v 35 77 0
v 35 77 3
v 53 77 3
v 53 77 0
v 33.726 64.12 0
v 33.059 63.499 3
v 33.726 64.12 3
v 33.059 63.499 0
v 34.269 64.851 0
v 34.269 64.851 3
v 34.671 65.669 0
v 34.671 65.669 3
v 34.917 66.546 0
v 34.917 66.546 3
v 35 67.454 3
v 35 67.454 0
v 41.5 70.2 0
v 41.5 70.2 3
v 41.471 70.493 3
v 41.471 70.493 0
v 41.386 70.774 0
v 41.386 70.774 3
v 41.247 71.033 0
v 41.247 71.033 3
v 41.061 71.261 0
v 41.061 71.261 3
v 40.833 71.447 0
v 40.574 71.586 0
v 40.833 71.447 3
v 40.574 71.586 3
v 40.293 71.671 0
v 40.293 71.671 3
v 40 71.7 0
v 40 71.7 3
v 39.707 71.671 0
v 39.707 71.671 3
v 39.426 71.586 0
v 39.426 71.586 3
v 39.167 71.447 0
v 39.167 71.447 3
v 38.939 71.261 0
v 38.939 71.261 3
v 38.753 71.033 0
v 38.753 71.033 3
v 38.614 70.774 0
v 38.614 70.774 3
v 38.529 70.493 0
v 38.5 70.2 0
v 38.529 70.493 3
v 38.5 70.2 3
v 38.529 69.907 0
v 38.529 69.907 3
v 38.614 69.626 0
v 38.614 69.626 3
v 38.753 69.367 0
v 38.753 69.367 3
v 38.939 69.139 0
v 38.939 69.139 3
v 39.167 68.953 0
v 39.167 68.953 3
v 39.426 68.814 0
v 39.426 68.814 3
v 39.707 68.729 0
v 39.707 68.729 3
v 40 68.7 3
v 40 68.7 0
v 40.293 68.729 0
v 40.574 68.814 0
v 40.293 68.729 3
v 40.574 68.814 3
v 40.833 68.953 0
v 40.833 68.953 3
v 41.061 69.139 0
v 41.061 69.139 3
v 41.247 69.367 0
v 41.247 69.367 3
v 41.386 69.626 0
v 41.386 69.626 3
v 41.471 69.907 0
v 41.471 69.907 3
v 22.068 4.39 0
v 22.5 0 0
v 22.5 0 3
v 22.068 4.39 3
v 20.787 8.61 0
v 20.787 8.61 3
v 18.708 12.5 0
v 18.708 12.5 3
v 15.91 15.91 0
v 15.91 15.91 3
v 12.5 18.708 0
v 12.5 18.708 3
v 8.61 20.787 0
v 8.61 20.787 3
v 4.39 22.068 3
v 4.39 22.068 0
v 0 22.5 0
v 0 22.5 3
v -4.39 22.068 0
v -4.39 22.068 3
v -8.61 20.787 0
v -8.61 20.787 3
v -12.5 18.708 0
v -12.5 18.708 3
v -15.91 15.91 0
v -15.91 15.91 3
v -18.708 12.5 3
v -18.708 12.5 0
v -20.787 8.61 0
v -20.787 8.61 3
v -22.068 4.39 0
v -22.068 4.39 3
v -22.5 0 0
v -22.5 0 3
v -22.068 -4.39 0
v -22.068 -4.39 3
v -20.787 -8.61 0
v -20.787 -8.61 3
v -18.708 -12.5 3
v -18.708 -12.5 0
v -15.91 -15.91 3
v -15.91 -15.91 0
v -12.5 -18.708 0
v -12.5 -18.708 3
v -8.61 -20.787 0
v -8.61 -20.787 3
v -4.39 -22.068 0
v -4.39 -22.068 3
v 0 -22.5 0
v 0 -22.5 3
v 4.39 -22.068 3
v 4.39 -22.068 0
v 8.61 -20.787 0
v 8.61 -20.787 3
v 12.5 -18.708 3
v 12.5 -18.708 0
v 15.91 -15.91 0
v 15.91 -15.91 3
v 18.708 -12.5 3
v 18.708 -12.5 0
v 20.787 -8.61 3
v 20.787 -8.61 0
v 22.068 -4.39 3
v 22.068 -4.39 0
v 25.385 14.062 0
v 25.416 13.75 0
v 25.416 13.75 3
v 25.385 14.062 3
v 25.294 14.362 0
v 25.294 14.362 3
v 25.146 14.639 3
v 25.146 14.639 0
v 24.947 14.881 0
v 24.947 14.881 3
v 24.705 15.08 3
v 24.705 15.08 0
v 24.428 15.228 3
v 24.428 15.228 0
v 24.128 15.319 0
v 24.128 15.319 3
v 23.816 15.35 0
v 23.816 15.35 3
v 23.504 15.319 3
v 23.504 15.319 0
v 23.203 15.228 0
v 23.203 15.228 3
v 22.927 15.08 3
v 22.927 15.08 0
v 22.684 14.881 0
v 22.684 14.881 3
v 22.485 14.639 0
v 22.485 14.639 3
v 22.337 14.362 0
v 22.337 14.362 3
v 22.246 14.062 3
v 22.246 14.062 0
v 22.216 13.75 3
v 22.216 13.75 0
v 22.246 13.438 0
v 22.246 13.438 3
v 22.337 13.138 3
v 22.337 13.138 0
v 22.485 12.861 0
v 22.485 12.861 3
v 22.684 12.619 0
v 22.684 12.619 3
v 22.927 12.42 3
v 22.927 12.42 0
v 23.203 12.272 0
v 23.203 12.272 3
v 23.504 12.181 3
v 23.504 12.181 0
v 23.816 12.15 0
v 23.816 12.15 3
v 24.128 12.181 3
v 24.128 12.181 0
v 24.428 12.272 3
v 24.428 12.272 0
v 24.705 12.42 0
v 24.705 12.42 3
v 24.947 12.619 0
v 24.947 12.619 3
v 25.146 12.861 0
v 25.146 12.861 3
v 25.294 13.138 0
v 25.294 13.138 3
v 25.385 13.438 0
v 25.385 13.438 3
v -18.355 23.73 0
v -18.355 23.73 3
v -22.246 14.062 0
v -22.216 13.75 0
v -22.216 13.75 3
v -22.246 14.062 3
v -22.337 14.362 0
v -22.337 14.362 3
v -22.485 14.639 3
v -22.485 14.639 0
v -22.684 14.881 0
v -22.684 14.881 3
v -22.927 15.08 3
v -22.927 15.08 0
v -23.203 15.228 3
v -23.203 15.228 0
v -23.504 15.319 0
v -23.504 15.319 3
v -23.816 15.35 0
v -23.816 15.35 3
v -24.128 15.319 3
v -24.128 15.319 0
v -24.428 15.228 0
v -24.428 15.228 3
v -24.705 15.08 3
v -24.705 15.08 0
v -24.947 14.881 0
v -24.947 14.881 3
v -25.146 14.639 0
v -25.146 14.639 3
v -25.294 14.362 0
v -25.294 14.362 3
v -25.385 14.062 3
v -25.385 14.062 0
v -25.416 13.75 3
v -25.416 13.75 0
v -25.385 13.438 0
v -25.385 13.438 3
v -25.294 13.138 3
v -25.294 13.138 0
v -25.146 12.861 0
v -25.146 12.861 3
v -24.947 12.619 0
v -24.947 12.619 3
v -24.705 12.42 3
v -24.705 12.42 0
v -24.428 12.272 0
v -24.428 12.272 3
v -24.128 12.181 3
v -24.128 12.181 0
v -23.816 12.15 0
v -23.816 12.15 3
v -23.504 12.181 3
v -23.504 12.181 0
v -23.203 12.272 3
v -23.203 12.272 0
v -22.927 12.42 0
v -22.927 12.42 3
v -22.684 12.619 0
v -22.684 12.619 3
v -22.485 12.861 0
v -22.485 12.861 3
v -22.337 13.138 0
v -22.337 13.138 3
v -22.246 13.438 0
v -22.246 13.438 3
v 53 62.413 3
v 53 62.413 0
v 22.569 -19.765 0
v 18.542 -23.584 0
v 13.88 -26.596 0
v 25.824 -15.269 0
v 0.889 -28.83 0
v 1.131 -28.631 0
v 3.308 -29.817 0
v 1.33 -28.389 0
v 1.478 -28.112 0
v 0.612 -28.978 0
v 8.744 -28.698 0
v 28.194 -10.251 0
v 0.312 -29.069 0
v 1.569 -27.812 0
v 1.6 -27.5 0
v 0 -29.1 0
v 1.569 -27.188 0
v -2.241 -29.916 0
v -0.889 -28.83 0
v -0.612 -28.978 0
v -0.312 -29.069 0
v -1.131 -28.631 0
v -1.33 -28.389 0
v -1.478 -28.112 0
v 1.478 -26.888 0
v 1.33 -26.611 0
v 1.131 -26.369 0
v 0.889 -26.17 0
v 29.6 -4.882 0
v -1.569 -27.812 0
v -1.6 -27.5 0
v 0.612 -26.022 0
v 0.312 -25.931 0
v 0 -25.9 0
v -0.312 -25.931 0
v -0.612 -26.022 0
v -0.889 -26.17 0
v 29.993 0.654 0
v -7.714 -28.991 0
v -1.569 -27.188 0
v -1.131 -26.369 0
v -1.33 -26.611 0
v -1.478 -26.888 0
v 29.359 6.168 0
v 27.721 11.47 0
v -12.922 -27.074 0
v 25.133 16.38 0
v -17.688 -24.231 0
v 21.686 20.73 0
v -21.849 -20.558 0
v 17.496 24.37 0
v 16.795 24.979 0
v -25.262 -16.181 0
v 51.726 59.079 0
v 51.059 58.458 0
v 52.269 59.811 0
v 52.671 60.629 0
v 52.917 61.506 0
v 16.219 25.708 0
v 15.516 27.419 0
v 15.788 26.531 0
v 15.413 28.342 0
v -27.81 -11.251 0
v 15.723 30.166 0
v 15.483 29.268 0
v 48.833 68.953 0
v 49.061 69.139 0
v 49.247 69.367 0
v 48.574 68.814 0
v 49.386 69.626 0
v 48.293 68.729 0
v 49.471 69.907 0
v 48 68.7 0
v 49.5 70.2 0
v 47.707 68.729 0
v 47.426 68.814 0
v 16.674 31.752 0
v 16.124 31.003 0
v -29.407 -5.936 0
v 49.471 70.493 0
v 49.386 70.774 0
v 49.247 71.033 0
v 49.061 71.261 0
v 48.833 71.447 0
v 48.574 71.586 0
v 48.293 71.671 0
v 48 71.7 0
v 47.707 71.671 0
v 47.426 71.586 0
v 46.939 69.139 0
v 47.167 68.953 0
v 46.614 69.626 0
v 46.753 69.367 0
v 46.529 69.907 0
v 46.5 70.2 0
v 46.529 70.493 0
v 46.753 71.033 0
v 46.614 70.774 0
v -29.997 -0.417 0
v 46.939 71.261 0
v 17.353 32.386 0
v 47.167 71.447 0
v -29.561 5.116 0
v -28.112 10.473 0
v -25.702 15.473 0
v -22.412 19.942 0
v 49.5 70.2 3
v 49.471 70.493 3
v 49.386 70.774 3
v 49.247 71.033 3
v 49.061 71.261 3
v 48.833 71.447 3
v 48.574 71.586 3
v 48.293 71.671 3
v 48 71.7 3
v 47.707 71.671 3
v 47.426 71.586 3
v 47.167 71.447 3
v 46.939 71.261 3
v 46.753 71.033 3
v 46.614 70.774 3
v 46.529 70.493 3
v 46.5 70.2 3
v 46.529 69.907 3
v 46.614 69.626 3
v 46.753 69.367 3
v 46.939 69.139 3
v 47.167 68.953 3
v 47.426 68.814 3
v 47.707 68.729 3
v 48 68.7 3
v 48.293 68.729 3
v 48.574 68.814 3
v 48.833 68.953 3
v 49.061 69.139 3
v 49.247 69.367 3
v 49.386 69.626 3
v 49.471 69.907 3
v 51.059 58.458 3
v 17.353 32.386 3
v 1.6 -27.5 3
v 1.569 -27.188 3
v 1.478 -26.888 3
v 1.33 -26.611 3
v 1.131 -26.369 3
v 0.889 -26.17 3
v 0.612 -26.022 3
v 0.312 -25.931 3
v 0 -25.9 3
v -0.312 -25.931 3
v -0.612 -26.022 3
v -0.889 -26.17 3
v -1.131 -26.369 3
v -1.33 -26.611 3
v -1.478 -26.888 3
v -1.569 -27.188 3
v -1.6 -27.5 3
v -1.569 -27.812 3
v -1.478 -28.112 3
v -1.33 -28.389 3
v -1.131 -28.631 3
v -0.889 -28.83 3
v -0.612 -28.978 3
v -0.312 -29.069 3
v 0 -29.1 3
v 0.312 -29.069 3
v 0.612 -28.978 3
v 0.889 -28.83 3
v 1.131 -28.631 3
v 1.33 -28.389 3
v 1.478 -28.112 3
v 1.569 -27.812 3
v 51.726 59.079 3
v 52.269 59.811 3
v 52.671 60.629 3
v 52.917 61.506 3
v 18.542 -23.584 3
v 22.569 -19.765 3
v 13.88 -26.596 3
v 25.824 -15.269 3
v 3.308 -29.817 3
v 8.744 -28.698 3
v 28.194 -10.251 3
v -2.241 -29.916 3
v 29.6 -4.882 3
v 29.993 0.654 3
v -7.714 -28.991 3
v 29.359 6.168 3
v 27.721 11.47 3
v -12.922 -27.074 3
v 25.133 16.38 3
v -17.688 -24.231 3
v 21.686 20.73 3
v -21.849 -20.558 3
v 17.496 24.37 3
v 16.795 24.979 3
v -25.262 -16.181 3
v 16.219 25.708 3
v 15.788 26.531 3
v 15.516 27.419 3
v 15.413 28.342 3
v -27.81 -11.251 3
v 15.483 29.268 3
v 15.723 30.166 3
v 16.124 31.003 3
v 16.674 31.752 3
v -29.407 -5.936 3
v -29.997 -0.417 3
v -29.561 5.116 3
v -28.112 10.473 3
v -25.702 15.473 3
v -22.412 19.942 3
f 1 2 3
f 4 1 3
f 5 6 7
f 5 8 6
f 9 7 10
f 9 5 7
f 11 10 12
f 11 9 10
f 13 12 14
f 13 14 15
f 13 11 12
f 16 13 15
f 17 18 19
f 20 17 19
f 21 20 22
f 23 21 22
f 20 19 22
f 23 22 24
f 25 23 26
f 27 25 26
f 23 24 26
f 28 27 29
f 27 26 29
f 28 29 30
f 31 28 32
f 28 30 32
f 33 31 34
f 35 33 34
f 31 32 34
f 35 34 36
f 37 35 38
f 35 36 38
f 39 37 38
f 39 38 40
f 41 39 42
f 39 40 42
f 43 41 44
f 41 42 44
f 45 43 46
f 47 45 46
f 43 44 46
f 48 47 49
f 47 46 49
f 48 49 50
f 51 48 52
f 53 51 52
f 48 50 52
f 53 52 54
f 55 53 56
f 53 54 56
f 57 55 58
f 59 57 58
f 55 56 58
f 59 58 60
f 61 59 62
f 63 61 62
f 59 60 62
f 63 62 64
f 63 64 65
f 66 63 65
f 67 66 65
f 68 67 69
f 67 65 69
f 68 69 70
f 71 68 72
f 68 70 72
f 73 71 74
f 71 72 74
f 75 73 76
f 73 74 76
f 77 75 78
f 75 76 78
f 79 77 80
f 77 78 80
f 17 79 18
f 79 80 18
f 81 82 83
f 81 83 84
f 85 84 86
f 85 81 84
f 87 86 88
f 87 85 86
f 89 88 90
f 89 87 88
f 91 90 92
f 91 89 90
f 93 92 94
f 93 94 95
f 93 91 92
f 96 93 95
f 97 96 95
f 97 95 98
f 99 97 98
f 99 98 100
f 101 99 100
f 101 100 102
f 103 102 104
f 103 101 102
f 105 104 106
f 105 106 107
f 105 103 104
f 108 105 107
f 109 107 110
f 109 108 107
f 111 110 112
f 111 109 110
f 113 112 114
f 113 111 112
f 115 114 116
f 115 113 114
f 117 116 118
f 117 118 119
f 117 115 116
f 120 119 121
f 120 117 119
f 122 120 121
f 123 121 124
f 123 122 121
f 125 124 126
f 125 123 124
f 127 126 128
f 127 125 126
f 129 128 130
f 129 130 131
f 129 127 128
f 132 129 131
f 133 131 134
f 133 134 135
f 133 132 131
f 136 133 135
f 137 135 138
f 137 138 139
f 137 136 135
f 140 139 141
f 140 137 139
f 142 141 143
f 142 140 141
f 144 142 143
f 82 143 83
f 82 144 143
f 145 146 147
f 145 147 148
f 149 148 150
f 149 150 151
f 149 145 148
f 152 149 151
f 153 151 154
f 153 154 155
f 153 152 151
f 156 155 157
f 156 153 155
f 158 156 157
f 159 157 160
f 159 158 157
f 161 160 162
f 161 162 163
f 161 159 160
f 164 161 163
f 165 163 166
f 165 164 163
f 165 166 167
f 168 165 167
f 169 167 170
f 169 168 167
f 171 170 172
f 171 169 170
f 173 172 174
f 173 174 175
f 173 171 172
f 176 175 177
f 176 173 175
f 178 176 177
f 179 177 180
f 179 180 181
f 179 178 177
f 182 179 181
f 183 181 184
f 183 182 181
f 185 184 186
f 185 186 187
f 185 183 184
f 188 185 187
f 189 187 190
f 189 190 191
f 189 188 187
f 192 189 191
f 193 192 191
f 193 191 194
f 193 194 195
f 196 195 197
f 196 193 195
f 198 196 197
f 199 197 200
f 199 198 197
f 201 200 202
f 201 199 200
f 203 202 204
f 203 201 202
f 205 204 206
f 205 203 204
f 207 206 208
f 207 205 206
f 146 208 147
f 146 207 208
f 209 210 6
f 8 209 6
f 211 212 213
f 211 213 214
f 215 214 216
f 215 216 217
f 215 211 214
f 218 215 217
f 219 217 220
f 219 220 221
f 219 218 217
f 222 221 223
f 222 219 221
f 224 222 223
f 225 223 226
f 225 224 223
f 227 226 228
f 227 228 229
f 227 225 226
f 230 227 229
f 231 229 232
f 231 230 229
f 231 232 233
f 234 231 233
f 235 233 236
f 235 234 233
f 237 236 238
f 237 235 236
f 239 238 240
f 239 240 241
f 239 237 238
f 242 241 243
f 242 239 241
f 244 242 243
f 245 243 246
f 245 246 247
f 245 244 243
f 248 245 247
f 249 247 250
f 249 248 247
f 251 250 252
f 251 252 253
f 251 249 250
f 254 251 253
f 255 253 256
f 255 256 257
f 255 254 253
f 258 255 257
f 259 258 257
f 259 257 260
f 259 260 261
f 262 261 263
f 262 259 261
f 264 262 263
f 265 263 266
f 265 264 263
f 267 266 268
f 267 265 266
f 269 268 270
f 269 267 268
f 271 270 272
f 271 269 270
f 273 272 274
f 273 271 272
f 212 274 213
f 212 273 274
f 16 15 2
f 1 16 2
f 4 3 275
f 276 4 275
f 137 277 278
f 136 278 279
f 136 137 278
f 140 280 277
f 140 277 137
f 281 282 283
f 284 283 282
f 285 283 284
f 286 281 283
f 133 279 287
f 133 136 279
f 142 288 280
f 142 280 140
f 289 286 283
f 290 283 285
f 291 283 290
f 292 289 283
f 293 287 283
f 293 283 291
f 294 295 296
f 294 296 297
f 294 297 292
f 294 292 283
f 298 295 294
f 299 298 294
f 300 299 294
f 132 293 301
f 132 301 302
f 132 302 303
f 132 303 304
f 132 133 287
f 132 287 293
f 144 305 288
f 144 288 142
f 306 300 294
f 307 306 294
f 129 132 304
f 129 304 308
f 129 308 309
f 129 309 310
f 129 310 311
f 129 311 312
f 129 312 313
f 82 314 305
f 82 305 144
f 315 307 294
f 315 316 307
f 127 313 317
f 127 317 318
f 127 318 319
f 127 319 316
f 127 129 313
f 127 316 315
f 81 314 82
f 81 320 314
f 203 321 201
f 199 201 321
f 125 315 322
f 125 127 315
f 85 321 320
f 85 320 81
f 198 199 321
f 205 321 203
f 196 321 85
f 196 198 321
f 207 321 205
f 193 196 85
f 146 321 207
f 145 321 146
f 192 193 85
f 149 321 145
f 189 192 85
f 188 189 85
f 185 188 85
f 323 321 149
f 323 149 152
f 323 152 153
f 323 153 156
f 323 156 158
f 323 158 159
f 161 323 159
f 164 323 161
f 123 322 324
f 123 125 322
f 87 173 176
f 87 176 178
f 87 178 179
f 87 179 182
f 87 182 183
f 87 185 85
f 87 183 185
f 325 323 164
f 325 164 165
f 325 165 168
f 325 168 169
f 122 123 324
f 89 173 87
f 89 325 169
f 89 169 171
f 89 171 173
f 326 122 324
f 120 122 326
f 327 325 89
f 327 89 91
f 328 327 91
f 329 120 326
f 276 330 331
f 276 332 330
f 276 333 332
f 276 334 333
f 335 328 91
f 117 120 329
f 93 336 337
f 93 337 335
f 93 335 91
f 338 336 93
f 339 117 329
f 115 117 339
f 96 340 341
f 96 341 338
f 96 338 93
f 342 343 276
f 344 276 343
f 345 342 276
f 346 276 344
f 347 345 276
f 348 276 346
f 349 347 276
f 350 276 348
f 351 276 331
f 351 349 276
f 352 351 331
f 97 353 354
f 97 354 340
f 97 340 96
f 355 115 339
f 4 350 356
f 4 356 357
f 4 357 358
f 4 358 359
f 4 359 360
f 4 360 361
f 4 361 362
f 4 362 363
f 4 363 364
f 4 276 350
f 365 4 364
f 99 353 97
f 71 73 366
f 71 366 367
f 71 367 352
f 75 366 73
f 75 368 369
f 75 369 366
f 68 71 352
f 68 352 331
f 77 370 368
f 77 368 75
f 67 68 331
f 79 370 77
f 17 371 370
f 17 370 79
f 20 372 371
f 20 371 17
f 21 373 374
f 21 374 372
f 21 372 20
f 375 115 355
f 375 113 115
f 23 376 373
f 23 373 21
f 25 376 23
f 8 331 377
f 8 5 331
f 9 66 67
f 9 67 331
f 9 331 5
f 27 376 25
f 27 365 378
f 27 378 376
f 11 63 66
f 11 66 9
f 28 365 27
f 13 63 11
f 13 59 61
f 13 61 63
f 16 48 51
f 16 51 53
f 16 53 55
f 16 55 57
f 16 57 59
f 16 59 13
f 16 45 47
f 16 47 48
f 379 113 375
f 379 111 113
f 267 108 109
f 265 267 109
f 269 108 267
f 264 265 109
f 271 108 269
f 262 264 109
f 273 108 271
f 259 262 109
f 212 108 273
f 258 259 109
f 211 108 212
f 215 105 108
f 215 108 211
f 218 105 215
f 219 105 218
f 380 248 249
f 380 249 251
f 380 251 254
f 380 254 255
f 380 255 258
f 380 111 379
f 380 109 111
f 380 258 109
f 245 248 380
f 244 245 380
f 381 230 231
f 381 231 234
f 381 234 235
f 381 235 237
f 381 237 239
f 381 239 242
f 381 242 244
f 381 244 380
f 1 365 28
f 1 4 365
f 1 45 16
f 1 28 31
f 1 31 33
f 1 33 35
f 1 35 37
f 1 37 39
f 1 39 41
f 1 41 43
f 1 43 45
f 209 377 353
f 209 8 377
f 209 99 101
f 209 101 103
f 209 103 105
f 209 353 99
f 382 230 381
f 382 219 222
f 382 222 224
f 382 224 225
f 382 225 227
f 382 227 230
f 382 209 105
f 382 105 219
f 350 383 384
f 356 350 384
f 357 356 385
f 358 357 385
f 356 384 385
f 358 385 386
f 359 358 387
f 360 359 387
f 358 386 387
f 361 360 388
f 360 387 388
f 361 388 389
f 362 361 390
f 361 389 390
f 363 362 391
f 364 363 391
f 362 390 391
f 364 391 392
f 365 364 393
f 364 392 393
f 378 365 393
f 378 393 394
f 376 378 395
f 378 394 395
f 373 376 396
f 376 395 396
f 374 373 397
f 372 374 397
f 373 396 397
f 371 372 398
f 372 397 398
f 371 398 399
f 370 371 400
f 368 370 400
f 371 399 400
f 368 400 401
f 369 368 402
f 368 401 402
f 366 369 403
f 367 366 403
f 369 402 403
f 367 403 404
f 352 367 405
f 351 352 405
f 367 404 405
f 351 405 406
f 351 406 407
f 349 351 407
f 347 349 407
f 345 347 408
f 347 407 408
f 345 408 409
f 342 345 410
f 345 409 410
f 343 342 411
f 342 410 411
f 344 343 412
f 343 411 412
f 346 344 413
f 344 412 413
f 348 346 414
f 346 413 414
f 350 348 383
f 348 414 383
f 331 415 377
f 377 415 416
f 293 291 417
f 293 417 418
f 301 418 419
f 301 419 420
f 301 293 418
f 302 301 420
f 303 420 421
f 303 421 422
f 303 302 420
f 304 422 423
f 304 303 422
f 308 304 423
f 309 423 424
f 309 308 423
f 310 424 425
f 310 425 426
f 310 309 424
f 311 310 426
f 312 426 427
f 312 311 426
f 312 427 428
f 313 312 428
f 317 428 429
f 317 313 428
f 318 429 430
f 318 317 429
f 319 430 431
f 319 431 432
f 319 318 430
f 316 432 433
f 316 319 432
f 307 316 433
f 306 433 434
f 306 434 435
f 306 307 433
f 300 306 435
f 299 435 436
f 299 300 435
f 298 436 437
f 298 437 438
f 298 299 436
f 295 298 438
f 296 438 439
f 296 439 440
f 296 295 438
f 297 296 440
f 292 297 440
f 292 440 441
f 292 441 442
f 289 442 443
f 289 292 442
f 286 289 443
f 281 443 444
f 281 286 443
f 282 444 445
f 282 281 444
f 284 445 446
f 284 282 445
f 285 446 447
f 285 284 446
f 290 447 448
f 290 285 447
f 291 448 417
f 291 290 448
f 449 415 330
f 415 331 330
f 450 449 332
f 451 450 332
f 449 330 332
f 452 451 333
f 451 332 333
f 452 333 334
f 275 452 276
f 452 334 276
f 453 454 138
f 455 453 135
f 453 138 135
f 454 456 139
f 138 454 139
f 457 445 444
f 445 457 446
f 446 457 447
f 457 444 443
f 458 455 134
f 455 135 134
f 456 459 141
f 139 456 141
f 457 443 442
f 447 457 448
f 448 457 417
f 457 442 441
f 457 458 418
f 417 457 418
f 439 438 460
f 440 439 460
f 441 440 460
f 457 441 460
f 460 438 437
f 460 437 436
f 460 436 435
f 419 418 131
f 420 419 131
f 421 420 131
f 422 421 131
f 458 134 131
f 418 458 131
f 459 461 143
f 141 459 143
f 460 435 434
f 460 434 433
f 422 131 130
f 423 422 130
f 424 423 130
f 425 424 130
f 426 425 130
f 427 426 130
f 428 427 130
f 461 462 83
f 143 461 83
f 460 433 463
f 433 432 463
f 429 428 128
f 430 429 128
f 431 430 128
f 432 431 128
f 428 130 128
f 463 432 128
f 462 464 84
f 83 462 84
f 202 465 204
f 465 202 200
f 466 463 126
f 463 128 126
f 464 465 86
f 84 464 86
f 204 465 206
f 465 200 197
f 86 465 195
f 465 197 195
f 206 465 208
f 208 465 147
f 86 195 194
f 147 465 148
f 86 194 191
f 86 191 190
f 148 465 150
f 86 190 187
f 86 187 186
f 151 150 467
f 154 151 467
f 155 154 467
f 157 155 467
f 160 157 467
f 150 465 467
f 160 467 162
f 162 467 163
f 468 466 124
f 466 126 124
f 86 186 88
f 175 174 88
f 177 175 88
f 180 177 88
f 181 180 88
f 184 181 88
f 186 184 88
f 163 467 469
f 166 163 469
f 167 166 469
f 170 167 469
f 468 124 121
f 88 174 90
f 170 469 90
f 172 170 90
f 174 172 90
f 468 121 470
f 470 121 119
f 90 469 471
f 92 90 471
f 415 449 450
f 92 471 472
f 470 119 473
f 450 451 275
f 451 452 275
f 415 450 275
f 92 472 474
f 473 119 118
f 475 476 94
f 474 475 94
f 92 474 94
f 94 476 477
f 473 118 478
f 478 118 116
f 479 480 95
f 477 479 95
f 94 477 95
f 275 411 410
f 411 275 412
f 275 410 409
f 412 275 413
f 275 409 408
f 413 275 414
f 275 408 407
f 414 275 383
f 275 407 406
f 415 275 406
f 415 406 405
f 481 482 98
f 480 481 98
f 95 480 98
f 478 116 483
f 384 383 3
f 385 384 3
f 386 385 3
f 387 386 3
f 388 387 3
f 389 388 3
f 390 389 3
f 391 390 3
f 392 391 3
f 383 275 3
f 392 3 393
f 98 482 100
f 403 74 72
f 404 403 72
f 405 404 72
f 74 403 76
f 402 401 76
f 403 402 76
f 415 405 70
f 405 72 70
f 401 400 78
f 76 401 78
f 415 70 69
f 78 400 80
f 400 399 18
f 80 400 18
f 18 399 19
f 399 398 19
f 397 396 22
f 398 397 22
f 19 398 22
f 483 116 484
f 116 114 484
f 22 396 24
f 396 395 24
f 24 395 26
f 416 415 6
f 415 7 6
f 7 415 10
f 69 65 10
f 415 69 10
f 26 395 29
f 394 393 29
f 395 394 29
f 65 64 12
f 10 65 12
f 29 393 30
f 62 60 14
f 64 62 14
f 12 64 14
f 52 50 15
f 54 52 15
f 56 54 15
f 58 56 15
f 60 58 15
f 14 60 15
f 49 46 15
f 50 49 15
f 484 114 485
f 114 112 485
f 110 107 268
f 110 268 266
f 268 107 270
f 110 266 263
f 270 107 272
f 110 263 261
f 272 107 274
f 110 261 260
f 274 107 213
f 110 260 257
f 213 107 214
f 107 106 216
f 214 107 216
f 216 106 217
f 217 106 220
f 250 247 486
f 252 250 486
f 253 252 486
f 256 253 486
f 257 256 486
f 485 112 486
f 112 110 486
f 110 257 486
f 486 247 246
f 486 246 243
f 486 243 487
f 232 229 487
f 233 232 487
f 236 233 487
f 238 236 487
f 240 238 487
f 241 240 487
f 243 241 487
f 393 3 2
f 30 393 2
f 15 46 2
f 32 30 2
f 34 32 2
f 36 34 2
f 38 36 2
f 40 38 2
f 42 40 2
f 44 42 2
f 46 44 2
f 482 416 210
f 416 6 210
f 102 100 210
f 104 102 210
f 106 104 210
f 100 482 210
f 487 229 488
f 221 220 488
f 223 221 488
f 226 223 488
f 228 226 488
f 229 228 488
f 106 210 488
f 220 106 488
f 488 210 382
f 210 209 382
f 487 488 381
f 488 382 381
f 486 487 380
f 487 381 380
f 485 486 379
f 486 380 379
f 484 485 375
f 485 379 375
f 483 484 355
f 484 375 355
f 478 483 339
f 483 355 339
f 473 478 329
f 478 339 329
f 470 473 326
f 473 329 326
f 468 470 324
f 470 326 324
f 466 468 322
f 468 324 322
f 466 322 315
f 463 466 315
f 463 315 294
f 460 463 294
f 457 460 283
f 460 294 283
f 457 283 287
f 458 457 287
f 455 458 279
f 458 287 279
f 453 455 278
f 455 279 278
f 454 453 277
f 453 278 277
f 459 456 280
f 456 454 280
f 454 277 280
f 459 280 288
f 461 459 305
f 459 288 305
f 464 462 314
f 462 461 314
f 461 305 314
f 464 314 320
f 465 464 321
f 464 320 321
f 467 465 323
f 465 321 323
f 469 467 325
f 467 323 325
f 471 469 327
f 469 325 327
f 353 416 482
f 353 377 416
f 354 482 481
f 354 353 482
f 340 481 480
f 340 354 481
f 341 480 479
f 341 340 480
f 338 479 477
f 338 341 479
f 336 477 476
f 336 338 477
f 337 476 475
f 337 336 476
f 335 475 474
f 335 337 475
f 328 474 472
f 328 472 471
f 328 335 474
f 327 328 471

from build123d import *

# Parameters (mm, degrees)
SKETCH_1_R      = 30
SKETCH_1_R_2    = 22.5
SKETCH_1_R_3    = 1.6
EXTRUDE_1_DEPTH = 3
SKETCH_4_R      = 1.5
EXTRUDE_3_DEPTH = 3
FILLET_1_R      = 5
FILLET_2_R      = 5


with BuildPart() as part:
    # 草图1 → 凸台-拉伸1 (new body)
    with BuildSketch(Plane.XY):
        Circle(SKETCH_1_R)
        Circle(SKETCH_1_R_2, mode=Mode.SUBTRACT)
        with Locations((23.815698604, 13.75)):
            Circle(SKETCH_1_R_3, mode=Mode.SUBTRACT)
        with Locations((0, -27.5)):
            Circle(SKETCH_1_R_3, mode=Mode.SUBTRACT)
        with Locations((-23.815698604, 13.75)):
            Circle(SKETCH_1_R_3, mode=Mode.SUBTRACT)
    extrude(amount=EXTRUDE_1_DEPTH)

    # 草图4 → 凸台-拉伸3 (add)
    with BuildSketch(Plane.XY.offset(3)):
        with BuildLine():
            Line((-18.354989219, 23.729609579), (35, 65))
            Line((35, 65), (35, 77))
            Line((35, 77), (53, 77))
            Line((53, 77), (53, 59.959453772))
            Line((53, 59.959453772), (11.372950108, 27.760691739))
            Line((11.372950108, 27.760691739), (1.135189229, 26.37246046))
            ThreePointArc((1.135189229, 26.37246046), (-0.214991049, 29.085490097), (-0.793931536, 26.110873398))
            Line((-0.793931536, 26.110873398), (-18.354989219, 23.729609579))
        make_face()
        with Locations((40, 70.2)):
            Circle(SKETCH_4_R, mode=Mode.SUBTRACT)
        with Locations((48, 70.2)):
            Circle(SKETCH_4_R, mode=Mode.SUBTRACT)
    extrude(amount=-EXTRUDE_3_DEPTH)

    # 圆角1
    fillet_1_edges = [part.edges().sort_by_distance(p)[0] for p in [
        (11.372950108, 27.760691739, 1.5),
    ]]
    fillet(fillet_1_edges, radius=FILLET_1_R)

    # 圆角2
    fillet_2_edges = [part.edges().sort_by_distance(p)[0] for p in [
        (35, 65, 1.5),
        (53, 59.959453772, 1.5),
    ]]
    fillet(fillet_2_edges, radius=FILLET_2_R)


solid = part.part
